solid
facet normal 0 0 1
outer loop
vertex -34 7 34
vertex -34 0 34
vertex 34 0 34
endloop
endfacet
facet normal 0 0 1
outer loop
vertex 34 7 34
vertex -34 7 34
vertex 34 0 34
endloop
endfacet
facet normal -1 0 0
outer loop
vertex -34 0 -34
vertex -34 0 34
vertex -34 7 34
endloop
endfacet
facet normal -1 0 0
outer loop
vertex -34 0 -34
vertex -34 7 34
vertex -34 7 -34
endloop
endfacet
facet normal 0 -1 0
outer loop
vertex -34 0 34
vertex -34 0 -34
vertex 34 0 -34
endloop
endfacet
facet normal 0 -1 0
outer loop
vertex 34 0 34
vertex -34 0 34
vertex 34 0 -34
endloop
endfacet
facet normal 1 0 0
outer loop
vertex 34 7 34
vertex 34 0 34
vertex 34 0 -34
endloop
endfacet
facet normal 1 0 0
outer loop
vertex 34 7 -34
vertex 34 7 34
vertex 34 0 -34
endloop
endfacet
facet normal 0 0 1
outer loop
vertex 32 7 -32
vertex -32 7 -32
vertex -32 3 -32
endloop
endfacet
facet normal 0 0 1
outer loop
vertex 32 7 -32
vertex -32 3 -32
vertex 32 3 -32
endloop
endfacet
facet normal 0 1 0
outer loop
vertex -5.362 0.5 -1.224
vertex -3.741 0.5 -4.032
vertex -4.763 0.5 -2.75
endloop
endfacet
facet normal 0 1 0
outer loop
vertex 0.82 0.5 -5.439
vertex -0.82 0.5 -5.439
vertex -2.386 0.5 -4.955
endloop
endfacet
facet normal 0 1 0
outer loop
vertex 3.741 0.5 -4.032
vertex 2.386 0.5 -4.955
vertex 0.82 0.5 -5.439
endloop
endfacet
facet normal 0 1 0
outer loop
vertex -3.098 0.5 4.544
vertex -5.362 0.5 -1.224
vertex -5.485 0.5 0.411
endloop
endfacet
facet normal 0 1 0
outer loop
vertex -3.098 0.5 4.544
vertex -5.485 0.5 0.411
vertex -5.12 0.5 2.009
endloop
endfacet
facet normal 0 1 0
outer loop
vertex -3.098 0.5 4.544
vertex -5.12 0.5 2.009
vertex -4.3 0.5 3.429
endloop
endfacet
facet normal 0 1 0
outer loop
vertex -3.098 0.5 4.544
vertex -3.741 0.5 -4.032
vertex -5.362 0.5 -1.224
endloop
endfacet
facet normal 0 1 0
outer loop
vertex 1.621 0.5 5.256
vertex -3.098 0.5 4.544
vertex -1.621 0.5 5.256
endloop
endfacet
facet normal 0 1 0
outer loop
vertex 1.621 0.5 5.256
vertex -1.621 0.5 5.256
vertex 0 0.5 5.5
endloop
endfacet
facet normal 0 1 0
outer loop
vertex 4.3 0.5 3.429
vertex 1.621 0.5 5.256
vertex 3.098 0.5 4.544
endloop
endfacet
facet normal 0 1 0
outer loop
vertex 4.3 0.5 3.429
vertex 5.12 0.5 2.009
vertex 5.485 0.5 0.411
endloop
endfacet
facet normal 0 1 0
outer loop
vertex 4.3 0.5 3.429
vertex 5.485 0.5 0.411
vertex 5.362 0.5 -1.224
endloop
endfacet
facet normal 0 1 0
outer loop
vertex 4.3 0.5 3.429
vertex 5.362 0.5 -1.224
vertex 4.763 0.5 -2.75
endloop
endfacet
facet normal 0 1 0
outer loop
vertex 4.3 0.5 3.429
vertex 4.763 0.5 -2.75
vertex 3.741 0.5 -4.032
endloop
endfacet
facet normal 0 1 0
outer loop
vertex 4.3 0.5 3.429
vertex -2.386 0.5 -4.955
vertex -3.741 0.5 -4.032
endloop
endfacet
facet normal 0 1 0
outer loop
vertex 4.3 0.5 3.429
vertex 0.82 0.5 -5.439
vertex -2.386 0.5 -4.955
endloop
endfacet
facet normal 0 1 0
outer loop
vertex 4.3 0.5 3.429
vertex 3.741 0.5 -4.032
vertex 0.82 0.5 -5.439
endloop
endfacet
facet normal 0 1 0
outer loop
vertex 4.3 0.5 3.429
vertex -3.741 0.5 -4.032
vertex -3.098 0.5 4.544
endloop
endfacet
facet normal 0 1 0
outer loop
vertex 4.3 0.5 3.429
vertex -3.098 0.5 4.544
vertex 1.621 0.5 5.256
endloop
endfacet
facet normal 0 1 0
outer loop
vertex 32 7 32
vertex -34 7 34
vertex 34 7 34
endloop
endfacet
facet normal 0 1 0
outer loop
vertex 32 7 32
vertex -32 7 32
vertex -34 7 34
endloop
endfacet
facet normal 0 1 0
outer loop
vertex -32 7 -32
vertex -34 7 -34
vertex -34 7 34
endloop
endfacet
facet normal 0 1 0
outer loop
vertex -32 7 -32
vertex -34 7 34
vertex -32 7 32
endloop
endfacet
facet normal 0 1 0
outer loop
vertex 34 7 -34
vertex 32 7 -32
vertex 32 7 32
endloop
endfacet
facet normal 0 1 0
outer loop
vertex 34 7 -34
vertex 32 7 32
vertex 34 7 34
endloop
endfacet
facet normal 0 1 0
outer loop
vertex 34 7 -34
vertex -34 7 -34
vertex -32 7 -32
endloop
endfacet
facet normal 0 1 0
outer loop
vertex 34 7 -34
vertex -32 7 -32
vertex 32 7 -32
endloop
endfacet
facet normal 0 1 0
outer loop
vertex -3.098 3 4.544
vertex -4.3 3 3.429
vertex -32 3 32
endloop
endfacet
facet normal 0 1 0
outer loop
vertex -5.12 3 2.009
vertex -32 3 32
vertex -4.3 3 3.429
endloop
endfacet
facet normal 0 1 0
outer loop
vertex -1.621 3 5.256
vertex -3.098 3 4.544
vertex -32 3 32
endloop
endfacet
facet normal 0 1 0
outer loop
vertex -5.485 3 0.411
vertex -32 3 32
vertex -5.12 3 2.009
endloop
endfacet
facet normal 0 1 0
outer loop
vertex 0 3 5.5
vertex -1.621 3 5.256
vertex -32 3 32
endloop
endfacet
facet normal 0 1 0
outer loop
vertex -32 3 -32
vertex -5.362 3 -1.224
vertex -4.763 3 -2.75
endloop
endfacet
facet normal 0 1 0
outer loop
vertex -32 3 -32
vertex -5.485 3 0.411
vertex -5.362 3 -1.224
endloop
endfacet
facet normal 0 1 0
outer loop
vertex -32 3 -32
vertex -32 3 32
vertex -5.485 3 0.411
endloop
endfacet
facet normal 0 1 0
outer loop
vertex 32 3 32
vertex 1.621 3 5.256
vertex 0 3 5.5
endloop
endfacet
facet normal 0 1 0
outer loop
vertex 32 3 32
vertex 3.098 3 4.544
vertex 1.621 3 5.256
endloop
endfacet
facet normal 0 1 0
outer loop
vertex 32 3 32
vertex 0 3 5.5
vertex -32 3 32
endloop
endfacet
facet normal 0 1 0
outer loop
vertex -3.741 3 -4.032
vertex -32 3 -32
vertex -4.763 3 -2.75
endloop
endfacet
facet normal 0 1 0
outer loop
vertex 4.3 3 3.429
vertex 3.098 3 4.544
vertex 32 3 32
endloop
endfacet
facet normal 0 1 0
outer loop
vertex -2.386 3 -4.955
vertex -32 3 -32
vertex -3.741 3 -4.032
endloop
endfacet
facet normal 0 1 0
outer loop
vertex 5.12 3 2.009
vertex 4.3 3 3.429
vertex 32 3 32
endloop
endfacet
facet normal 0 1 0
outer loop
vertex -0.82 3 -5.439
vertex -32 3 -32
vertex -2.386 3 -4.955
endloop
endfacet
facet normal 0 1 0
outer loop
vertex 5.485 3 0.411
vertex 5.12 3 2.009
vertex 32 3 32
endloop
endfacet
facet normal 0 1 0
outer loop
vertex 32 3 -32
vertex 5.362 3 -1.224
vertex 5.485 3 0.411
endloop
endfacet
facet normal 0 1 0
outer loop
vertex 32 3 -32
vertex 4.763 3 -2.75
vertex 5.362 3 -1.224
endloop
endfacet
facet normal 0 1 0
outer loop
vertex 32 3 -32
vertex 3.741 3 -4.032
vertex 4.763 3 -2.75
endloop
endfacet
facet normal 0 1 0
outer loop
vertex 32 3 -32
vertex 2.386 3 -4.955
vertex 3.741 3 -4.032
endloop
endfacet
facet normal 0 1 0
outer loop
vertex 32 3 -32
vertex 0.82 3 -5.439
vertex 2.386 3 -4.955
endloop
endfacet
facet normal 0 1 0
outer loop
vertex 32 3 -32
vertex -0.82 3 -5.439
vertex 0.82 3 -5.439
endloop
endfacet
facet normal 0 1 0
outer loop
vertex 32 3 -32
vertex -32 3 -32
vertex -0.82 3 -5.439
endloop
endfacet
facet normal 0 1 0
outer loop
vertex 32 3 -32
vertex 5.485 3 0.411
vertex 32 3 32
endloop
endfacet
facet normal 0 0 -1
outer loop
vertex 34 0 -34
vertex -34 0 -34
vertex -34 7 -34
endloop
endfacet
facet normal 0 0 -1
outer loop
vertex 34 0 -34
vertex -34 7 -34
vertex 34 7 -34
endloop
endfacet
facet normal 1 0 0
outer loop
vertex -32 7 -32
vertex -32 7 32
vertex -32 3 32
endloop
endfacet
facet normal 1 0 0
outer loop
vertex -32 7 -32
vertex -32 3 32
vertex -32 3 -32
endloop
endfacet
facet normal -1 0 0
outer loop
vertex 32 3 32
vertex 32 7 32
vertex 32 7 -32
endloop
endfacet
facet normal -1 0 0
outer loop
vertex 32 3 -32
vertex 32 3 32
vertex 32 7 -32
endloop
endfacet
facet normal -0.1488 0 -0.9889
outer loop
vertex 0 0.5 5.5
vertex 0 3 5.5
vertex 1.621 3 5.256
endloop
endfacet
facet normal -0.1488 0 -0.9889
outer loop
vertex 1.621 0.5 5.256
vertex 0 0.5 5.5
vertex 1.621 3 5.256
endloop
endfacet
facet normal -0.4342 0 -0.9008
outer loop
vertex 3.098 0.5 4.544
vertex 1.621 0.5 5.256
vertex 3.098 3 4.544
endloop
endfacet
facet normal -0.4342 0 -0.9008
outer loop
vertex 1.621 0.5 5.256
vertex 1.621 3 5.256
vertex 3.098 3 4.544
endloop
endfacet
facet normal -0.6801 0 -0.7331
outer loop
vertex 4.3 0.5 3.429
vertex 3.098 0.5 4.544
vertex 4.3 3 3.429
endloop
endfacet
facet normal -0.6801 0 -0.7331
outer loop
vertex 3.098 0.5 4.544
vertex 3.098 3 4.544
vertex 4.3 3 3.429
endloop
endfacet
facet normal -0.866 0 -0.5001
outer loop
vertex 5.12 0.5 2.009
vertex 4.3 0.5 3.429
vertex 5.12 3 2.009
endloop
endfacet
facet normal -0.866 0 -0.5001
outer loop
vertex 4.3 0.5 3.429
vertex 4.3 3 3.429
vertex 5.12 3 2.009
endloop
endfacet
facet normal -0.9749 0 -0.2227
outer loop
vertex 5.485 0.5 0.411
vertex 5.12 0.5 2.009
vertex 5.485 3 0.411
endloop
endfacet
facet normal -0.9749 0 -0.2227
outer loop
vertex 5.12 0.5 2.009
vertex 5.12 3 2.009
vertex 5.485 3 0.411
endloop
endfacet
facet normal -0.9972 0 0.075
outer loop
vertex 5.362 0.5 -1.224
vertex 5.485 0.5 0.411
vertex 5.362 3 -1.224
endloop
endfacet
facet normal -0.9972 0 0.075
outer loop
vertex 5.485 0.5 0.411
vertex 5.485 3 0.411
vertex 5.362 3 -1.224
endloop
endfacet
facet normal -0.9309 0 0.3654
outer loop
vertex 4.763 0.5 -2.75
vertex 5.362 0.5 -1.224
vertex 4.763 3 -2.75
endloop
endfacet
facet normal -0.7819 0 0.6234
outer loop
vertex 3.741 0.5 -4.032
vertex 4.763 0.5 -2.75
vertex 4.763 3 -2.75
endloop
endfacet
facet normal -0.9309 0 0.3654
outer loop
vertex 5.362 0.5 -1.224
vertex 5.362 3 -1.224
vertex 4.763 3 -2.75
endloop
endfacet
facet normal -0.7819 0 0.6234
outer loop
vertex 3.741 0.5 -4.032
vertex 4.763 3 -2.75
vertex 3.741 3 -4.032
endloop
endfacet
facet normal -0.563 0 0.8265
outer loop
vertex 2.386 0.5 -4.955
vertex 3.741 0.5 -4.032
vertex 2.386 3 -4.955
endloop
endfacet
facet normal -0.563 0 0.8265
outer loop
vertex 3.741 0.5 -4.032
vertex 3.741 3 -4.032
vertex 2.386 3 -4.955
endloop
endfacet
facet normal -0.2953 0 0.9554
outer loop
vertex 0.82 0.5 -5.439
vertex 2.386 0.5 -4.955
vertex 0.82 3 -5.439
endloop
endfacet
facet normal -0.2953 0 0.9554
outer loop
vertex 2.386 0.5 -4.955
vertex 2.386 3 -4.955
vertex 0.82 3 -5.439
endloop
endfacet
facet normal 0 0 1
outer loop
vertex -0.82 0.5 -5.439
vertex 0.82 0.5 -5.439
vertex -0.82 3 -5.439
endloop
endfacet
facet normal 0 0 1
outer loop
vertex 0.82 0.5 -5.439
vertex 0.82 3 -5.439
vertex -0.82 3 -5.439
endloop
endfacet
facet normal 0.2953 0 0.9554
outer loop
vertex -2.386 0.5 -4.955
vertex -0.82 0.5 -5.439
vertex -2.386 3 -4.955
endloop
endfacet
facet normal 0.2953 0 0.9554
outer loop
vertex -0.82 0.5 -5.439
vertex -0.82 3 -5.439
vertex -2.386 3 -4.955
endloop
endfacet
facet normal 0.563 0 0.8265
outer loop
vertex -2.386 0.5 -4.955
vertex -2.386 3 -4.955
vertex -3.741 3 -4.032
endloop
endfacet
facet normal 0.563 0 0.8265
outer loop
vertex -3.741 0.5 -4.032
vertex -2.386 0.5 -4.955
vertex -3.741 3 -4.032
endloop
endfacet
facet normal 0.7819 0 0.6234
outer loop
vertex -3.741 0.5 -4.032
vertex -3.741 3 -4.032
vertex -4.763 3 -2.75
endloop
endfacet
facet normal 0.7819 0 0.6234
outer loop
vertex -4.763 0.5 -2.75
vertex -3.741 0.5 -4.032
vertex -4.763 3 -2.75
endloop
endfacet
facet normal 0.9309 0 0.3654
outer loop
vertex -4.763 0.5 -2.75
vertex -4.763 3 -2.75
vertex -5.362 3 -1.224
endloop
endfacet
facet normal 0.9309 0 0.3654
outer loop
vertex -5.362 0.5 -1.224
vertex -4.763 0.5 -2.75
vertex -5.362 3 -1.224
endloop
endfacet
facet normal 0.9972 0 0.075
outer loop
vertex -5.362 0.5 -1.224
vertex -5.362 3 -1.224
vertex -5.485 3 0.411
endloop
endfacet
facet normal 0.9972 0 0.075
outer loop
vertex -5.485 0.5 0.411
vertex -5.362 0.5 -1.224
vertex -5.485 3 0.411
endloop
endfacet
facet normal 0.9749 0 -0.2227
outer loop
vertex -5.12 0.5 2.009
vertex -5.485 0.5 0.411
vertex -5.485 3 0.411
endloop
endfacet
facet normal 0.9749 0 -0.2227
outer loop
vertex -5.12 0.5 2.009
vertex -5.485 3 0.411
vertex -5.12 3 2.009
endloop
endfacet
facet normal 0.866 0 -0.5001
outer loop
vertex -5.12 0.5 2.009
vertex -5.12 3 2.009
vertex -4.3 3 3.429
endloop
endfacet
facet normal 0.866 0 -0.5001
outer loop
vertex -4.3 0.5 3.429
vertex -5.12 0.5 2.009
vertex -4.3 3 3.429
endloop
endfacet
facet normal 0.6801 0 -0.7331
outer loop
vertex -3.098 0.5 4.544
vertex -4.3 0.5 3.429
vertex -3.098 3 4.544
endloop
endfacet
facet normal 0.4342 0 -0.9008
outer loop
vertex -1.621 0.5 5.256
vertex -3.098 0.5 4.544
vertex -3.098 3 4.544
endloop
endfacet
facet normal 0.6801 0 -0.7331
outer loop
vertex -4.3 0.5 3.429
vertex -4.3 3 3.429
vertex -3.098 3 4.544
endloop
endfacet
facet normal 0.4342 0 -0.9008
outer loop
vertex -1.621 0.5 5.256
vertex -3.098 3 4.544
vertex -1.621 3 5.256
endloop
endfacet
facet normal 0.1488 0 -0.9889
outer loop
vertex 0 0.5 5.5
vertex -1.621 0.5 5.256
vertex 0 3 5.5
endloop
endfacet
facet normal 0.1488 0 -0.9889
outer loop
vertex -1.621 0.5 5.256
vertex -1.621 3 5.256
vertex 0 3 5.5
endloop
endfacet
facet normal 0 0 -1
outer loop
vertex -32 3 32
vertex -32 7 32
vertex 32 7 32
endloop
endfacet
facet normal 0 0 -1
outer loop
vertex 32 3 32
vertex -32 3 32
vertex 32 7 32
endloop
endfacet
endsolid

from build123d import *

# Parameters (mm, degrees)
SKETCH1_W           = 68
SKETCH1_H           = 68
BOSS_EXTRUDE1_DEPTH = 7
SKETCH2_W           = 64
SKETCH2_H           = 64
CUT_EXTRUDE1_DEPTH  = 4
SKETCH3_R           = 5.5
CUT_EXTRUDE2_DEPTH  = 2.5


with BuildPart() as part:
    # Sketch1 → Boss-Extrude1 (new body)
    with BuildSketch(Plane(origin=(0, 0, 0), x_dir=(1, 0, 0), z_dir=(0, 1, 0))):
        Rectangle(SKETCH1_W, SKETCH1_H)
    extrude(amount=BOSS_EXTRUDE1_DEPTH)

    # Sketch2 → Cut-Extrude1 (cut)
    with BuildSketch(Plane(origin=(0, 7, 0), x_dir=(1, 0, 0), z_dir=(0, 1, 0))):
        Rectangle(SKETCH2_W, SKETCH2_H)
    extrude(amount=-CUT_EXTRUDE1_DEPTH, mode=Mode.SUBTRACT)

    # Sketch3 → Cut-Extrude2 (cut)
    with BuildSketch(Plane(origin=(0, 3, 0), x_dir=(1, 0, 0), z_dir=(0, 1, 0))):
        with Locations(Location((0, 0, 0), (0, 0, 270))):
            Circle(SKETCH3_R)
    extrude(amount=-CUT_EXTRUDE2_DEPTH, mode=Mode.SUBTRACT)


solid = part.part
